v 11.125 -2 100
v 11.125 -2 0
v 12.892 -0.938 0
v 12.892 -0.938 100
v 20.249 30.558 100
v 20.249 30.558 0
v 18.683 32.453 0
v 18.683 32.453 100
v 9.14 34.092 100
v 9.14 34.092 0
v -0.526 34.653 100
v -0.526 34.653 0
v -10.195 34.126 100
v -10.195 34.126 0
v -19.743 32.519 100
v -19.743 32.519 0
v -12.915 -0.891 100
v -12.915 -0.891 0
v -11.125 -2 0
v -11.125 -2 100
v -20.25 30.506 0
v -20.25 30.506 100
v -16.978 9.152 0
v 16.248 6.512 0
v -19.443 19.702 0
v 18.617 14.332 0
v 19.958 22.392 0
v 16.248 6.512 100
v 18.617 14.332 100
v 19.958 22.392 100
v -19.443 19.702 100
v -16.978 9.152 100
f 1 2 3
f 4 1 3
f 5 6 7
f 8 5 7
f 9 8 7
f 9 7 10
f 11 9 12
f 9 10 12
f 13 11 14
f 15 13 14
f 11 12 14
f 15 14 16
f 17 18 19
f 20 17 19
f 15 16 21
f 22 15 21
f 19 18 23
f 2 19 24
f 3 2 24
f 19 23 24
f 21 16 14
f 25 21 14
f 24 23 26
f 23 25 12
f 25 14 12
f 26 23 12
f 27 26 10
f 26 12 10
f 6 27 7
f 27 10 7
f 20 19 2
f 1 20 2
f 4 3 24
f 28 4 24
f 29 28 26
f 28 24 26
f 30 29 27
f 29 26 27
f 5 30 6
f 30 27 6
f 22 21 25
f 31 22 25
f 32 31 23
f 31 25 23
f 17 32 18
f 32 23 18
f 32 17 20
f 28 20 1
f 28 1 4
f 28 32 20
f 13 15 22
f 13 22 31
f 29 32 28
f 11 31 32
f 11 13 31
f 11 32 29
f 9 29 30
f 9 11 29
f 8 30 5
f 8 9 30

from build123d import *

# Parameters (mm, degrees)
F1_DEPTH = 100


with BuildPart() as f1:
    # F0 (on Top) → F1 (new body)
    with BuildSketch(Plane.XY):
        with BuildLine():
            Line((20.24916, 30.557973), (18.683154, 32.452531))
            ThreePointArc((18.683154, 32.452531), (-0.526402, 34.65267), (-19.74347, 32.519136))
            Line((-19.74347, 32.519136), (-20.249992, 30.505758))
            ThreePointArc((-20.249992, 30.505758), (-18.414901, 14.379255), (-12.91545, -0.89123))
            Line((-12.91545, -0.89123), (-11.125, -2))
            Line((-11.125, -2), (0, -2))
            Line((0, -2), (11.125, -2))
            Line((11.125, -2), (12.89157, -0.937672))
            ThreePointArc((12.89157, -0.937672), (18.617034, 14.332035), (20.24916, 30.557973))
        make_face()
        with BuildLine():
            Line((11.125, 0), (0, 0))
            Line((0, 0), (-11.125, 0))
            ThreePointArc((-11.125, 0), (-16.501317, 14.980406), (-18.248473, 30.800166))
            ThreePointArc((-18.248473, 30.800166), (0.017215, 32.649949), (18.250002, 30.499932))
            ThreePointArc((18.250002, 30.499932), (16.669461, 14.786966), (11.125, 0))
        make_face(mode=Mode.SUBTRACT)
        with BuildLine():
            Line((-11.125, 0), (0, 0))
            Line((0, 0), (11.125, 0))
            ThreePointArc((11.125, 0), (16.669461, 14.786966), (18.250002, 30.499932))
            ThreePointArc((18.250002, 30.499932), (0.017215, 32.649949), (-18.248473, 30.800166))
            ThreePointArc((-18.248473, 30.800166), (-16.501317, 14.980406), (-11.125, 0))
        make_face()
    extrude(amount=F1_DEPTH)


solid = f1.part
